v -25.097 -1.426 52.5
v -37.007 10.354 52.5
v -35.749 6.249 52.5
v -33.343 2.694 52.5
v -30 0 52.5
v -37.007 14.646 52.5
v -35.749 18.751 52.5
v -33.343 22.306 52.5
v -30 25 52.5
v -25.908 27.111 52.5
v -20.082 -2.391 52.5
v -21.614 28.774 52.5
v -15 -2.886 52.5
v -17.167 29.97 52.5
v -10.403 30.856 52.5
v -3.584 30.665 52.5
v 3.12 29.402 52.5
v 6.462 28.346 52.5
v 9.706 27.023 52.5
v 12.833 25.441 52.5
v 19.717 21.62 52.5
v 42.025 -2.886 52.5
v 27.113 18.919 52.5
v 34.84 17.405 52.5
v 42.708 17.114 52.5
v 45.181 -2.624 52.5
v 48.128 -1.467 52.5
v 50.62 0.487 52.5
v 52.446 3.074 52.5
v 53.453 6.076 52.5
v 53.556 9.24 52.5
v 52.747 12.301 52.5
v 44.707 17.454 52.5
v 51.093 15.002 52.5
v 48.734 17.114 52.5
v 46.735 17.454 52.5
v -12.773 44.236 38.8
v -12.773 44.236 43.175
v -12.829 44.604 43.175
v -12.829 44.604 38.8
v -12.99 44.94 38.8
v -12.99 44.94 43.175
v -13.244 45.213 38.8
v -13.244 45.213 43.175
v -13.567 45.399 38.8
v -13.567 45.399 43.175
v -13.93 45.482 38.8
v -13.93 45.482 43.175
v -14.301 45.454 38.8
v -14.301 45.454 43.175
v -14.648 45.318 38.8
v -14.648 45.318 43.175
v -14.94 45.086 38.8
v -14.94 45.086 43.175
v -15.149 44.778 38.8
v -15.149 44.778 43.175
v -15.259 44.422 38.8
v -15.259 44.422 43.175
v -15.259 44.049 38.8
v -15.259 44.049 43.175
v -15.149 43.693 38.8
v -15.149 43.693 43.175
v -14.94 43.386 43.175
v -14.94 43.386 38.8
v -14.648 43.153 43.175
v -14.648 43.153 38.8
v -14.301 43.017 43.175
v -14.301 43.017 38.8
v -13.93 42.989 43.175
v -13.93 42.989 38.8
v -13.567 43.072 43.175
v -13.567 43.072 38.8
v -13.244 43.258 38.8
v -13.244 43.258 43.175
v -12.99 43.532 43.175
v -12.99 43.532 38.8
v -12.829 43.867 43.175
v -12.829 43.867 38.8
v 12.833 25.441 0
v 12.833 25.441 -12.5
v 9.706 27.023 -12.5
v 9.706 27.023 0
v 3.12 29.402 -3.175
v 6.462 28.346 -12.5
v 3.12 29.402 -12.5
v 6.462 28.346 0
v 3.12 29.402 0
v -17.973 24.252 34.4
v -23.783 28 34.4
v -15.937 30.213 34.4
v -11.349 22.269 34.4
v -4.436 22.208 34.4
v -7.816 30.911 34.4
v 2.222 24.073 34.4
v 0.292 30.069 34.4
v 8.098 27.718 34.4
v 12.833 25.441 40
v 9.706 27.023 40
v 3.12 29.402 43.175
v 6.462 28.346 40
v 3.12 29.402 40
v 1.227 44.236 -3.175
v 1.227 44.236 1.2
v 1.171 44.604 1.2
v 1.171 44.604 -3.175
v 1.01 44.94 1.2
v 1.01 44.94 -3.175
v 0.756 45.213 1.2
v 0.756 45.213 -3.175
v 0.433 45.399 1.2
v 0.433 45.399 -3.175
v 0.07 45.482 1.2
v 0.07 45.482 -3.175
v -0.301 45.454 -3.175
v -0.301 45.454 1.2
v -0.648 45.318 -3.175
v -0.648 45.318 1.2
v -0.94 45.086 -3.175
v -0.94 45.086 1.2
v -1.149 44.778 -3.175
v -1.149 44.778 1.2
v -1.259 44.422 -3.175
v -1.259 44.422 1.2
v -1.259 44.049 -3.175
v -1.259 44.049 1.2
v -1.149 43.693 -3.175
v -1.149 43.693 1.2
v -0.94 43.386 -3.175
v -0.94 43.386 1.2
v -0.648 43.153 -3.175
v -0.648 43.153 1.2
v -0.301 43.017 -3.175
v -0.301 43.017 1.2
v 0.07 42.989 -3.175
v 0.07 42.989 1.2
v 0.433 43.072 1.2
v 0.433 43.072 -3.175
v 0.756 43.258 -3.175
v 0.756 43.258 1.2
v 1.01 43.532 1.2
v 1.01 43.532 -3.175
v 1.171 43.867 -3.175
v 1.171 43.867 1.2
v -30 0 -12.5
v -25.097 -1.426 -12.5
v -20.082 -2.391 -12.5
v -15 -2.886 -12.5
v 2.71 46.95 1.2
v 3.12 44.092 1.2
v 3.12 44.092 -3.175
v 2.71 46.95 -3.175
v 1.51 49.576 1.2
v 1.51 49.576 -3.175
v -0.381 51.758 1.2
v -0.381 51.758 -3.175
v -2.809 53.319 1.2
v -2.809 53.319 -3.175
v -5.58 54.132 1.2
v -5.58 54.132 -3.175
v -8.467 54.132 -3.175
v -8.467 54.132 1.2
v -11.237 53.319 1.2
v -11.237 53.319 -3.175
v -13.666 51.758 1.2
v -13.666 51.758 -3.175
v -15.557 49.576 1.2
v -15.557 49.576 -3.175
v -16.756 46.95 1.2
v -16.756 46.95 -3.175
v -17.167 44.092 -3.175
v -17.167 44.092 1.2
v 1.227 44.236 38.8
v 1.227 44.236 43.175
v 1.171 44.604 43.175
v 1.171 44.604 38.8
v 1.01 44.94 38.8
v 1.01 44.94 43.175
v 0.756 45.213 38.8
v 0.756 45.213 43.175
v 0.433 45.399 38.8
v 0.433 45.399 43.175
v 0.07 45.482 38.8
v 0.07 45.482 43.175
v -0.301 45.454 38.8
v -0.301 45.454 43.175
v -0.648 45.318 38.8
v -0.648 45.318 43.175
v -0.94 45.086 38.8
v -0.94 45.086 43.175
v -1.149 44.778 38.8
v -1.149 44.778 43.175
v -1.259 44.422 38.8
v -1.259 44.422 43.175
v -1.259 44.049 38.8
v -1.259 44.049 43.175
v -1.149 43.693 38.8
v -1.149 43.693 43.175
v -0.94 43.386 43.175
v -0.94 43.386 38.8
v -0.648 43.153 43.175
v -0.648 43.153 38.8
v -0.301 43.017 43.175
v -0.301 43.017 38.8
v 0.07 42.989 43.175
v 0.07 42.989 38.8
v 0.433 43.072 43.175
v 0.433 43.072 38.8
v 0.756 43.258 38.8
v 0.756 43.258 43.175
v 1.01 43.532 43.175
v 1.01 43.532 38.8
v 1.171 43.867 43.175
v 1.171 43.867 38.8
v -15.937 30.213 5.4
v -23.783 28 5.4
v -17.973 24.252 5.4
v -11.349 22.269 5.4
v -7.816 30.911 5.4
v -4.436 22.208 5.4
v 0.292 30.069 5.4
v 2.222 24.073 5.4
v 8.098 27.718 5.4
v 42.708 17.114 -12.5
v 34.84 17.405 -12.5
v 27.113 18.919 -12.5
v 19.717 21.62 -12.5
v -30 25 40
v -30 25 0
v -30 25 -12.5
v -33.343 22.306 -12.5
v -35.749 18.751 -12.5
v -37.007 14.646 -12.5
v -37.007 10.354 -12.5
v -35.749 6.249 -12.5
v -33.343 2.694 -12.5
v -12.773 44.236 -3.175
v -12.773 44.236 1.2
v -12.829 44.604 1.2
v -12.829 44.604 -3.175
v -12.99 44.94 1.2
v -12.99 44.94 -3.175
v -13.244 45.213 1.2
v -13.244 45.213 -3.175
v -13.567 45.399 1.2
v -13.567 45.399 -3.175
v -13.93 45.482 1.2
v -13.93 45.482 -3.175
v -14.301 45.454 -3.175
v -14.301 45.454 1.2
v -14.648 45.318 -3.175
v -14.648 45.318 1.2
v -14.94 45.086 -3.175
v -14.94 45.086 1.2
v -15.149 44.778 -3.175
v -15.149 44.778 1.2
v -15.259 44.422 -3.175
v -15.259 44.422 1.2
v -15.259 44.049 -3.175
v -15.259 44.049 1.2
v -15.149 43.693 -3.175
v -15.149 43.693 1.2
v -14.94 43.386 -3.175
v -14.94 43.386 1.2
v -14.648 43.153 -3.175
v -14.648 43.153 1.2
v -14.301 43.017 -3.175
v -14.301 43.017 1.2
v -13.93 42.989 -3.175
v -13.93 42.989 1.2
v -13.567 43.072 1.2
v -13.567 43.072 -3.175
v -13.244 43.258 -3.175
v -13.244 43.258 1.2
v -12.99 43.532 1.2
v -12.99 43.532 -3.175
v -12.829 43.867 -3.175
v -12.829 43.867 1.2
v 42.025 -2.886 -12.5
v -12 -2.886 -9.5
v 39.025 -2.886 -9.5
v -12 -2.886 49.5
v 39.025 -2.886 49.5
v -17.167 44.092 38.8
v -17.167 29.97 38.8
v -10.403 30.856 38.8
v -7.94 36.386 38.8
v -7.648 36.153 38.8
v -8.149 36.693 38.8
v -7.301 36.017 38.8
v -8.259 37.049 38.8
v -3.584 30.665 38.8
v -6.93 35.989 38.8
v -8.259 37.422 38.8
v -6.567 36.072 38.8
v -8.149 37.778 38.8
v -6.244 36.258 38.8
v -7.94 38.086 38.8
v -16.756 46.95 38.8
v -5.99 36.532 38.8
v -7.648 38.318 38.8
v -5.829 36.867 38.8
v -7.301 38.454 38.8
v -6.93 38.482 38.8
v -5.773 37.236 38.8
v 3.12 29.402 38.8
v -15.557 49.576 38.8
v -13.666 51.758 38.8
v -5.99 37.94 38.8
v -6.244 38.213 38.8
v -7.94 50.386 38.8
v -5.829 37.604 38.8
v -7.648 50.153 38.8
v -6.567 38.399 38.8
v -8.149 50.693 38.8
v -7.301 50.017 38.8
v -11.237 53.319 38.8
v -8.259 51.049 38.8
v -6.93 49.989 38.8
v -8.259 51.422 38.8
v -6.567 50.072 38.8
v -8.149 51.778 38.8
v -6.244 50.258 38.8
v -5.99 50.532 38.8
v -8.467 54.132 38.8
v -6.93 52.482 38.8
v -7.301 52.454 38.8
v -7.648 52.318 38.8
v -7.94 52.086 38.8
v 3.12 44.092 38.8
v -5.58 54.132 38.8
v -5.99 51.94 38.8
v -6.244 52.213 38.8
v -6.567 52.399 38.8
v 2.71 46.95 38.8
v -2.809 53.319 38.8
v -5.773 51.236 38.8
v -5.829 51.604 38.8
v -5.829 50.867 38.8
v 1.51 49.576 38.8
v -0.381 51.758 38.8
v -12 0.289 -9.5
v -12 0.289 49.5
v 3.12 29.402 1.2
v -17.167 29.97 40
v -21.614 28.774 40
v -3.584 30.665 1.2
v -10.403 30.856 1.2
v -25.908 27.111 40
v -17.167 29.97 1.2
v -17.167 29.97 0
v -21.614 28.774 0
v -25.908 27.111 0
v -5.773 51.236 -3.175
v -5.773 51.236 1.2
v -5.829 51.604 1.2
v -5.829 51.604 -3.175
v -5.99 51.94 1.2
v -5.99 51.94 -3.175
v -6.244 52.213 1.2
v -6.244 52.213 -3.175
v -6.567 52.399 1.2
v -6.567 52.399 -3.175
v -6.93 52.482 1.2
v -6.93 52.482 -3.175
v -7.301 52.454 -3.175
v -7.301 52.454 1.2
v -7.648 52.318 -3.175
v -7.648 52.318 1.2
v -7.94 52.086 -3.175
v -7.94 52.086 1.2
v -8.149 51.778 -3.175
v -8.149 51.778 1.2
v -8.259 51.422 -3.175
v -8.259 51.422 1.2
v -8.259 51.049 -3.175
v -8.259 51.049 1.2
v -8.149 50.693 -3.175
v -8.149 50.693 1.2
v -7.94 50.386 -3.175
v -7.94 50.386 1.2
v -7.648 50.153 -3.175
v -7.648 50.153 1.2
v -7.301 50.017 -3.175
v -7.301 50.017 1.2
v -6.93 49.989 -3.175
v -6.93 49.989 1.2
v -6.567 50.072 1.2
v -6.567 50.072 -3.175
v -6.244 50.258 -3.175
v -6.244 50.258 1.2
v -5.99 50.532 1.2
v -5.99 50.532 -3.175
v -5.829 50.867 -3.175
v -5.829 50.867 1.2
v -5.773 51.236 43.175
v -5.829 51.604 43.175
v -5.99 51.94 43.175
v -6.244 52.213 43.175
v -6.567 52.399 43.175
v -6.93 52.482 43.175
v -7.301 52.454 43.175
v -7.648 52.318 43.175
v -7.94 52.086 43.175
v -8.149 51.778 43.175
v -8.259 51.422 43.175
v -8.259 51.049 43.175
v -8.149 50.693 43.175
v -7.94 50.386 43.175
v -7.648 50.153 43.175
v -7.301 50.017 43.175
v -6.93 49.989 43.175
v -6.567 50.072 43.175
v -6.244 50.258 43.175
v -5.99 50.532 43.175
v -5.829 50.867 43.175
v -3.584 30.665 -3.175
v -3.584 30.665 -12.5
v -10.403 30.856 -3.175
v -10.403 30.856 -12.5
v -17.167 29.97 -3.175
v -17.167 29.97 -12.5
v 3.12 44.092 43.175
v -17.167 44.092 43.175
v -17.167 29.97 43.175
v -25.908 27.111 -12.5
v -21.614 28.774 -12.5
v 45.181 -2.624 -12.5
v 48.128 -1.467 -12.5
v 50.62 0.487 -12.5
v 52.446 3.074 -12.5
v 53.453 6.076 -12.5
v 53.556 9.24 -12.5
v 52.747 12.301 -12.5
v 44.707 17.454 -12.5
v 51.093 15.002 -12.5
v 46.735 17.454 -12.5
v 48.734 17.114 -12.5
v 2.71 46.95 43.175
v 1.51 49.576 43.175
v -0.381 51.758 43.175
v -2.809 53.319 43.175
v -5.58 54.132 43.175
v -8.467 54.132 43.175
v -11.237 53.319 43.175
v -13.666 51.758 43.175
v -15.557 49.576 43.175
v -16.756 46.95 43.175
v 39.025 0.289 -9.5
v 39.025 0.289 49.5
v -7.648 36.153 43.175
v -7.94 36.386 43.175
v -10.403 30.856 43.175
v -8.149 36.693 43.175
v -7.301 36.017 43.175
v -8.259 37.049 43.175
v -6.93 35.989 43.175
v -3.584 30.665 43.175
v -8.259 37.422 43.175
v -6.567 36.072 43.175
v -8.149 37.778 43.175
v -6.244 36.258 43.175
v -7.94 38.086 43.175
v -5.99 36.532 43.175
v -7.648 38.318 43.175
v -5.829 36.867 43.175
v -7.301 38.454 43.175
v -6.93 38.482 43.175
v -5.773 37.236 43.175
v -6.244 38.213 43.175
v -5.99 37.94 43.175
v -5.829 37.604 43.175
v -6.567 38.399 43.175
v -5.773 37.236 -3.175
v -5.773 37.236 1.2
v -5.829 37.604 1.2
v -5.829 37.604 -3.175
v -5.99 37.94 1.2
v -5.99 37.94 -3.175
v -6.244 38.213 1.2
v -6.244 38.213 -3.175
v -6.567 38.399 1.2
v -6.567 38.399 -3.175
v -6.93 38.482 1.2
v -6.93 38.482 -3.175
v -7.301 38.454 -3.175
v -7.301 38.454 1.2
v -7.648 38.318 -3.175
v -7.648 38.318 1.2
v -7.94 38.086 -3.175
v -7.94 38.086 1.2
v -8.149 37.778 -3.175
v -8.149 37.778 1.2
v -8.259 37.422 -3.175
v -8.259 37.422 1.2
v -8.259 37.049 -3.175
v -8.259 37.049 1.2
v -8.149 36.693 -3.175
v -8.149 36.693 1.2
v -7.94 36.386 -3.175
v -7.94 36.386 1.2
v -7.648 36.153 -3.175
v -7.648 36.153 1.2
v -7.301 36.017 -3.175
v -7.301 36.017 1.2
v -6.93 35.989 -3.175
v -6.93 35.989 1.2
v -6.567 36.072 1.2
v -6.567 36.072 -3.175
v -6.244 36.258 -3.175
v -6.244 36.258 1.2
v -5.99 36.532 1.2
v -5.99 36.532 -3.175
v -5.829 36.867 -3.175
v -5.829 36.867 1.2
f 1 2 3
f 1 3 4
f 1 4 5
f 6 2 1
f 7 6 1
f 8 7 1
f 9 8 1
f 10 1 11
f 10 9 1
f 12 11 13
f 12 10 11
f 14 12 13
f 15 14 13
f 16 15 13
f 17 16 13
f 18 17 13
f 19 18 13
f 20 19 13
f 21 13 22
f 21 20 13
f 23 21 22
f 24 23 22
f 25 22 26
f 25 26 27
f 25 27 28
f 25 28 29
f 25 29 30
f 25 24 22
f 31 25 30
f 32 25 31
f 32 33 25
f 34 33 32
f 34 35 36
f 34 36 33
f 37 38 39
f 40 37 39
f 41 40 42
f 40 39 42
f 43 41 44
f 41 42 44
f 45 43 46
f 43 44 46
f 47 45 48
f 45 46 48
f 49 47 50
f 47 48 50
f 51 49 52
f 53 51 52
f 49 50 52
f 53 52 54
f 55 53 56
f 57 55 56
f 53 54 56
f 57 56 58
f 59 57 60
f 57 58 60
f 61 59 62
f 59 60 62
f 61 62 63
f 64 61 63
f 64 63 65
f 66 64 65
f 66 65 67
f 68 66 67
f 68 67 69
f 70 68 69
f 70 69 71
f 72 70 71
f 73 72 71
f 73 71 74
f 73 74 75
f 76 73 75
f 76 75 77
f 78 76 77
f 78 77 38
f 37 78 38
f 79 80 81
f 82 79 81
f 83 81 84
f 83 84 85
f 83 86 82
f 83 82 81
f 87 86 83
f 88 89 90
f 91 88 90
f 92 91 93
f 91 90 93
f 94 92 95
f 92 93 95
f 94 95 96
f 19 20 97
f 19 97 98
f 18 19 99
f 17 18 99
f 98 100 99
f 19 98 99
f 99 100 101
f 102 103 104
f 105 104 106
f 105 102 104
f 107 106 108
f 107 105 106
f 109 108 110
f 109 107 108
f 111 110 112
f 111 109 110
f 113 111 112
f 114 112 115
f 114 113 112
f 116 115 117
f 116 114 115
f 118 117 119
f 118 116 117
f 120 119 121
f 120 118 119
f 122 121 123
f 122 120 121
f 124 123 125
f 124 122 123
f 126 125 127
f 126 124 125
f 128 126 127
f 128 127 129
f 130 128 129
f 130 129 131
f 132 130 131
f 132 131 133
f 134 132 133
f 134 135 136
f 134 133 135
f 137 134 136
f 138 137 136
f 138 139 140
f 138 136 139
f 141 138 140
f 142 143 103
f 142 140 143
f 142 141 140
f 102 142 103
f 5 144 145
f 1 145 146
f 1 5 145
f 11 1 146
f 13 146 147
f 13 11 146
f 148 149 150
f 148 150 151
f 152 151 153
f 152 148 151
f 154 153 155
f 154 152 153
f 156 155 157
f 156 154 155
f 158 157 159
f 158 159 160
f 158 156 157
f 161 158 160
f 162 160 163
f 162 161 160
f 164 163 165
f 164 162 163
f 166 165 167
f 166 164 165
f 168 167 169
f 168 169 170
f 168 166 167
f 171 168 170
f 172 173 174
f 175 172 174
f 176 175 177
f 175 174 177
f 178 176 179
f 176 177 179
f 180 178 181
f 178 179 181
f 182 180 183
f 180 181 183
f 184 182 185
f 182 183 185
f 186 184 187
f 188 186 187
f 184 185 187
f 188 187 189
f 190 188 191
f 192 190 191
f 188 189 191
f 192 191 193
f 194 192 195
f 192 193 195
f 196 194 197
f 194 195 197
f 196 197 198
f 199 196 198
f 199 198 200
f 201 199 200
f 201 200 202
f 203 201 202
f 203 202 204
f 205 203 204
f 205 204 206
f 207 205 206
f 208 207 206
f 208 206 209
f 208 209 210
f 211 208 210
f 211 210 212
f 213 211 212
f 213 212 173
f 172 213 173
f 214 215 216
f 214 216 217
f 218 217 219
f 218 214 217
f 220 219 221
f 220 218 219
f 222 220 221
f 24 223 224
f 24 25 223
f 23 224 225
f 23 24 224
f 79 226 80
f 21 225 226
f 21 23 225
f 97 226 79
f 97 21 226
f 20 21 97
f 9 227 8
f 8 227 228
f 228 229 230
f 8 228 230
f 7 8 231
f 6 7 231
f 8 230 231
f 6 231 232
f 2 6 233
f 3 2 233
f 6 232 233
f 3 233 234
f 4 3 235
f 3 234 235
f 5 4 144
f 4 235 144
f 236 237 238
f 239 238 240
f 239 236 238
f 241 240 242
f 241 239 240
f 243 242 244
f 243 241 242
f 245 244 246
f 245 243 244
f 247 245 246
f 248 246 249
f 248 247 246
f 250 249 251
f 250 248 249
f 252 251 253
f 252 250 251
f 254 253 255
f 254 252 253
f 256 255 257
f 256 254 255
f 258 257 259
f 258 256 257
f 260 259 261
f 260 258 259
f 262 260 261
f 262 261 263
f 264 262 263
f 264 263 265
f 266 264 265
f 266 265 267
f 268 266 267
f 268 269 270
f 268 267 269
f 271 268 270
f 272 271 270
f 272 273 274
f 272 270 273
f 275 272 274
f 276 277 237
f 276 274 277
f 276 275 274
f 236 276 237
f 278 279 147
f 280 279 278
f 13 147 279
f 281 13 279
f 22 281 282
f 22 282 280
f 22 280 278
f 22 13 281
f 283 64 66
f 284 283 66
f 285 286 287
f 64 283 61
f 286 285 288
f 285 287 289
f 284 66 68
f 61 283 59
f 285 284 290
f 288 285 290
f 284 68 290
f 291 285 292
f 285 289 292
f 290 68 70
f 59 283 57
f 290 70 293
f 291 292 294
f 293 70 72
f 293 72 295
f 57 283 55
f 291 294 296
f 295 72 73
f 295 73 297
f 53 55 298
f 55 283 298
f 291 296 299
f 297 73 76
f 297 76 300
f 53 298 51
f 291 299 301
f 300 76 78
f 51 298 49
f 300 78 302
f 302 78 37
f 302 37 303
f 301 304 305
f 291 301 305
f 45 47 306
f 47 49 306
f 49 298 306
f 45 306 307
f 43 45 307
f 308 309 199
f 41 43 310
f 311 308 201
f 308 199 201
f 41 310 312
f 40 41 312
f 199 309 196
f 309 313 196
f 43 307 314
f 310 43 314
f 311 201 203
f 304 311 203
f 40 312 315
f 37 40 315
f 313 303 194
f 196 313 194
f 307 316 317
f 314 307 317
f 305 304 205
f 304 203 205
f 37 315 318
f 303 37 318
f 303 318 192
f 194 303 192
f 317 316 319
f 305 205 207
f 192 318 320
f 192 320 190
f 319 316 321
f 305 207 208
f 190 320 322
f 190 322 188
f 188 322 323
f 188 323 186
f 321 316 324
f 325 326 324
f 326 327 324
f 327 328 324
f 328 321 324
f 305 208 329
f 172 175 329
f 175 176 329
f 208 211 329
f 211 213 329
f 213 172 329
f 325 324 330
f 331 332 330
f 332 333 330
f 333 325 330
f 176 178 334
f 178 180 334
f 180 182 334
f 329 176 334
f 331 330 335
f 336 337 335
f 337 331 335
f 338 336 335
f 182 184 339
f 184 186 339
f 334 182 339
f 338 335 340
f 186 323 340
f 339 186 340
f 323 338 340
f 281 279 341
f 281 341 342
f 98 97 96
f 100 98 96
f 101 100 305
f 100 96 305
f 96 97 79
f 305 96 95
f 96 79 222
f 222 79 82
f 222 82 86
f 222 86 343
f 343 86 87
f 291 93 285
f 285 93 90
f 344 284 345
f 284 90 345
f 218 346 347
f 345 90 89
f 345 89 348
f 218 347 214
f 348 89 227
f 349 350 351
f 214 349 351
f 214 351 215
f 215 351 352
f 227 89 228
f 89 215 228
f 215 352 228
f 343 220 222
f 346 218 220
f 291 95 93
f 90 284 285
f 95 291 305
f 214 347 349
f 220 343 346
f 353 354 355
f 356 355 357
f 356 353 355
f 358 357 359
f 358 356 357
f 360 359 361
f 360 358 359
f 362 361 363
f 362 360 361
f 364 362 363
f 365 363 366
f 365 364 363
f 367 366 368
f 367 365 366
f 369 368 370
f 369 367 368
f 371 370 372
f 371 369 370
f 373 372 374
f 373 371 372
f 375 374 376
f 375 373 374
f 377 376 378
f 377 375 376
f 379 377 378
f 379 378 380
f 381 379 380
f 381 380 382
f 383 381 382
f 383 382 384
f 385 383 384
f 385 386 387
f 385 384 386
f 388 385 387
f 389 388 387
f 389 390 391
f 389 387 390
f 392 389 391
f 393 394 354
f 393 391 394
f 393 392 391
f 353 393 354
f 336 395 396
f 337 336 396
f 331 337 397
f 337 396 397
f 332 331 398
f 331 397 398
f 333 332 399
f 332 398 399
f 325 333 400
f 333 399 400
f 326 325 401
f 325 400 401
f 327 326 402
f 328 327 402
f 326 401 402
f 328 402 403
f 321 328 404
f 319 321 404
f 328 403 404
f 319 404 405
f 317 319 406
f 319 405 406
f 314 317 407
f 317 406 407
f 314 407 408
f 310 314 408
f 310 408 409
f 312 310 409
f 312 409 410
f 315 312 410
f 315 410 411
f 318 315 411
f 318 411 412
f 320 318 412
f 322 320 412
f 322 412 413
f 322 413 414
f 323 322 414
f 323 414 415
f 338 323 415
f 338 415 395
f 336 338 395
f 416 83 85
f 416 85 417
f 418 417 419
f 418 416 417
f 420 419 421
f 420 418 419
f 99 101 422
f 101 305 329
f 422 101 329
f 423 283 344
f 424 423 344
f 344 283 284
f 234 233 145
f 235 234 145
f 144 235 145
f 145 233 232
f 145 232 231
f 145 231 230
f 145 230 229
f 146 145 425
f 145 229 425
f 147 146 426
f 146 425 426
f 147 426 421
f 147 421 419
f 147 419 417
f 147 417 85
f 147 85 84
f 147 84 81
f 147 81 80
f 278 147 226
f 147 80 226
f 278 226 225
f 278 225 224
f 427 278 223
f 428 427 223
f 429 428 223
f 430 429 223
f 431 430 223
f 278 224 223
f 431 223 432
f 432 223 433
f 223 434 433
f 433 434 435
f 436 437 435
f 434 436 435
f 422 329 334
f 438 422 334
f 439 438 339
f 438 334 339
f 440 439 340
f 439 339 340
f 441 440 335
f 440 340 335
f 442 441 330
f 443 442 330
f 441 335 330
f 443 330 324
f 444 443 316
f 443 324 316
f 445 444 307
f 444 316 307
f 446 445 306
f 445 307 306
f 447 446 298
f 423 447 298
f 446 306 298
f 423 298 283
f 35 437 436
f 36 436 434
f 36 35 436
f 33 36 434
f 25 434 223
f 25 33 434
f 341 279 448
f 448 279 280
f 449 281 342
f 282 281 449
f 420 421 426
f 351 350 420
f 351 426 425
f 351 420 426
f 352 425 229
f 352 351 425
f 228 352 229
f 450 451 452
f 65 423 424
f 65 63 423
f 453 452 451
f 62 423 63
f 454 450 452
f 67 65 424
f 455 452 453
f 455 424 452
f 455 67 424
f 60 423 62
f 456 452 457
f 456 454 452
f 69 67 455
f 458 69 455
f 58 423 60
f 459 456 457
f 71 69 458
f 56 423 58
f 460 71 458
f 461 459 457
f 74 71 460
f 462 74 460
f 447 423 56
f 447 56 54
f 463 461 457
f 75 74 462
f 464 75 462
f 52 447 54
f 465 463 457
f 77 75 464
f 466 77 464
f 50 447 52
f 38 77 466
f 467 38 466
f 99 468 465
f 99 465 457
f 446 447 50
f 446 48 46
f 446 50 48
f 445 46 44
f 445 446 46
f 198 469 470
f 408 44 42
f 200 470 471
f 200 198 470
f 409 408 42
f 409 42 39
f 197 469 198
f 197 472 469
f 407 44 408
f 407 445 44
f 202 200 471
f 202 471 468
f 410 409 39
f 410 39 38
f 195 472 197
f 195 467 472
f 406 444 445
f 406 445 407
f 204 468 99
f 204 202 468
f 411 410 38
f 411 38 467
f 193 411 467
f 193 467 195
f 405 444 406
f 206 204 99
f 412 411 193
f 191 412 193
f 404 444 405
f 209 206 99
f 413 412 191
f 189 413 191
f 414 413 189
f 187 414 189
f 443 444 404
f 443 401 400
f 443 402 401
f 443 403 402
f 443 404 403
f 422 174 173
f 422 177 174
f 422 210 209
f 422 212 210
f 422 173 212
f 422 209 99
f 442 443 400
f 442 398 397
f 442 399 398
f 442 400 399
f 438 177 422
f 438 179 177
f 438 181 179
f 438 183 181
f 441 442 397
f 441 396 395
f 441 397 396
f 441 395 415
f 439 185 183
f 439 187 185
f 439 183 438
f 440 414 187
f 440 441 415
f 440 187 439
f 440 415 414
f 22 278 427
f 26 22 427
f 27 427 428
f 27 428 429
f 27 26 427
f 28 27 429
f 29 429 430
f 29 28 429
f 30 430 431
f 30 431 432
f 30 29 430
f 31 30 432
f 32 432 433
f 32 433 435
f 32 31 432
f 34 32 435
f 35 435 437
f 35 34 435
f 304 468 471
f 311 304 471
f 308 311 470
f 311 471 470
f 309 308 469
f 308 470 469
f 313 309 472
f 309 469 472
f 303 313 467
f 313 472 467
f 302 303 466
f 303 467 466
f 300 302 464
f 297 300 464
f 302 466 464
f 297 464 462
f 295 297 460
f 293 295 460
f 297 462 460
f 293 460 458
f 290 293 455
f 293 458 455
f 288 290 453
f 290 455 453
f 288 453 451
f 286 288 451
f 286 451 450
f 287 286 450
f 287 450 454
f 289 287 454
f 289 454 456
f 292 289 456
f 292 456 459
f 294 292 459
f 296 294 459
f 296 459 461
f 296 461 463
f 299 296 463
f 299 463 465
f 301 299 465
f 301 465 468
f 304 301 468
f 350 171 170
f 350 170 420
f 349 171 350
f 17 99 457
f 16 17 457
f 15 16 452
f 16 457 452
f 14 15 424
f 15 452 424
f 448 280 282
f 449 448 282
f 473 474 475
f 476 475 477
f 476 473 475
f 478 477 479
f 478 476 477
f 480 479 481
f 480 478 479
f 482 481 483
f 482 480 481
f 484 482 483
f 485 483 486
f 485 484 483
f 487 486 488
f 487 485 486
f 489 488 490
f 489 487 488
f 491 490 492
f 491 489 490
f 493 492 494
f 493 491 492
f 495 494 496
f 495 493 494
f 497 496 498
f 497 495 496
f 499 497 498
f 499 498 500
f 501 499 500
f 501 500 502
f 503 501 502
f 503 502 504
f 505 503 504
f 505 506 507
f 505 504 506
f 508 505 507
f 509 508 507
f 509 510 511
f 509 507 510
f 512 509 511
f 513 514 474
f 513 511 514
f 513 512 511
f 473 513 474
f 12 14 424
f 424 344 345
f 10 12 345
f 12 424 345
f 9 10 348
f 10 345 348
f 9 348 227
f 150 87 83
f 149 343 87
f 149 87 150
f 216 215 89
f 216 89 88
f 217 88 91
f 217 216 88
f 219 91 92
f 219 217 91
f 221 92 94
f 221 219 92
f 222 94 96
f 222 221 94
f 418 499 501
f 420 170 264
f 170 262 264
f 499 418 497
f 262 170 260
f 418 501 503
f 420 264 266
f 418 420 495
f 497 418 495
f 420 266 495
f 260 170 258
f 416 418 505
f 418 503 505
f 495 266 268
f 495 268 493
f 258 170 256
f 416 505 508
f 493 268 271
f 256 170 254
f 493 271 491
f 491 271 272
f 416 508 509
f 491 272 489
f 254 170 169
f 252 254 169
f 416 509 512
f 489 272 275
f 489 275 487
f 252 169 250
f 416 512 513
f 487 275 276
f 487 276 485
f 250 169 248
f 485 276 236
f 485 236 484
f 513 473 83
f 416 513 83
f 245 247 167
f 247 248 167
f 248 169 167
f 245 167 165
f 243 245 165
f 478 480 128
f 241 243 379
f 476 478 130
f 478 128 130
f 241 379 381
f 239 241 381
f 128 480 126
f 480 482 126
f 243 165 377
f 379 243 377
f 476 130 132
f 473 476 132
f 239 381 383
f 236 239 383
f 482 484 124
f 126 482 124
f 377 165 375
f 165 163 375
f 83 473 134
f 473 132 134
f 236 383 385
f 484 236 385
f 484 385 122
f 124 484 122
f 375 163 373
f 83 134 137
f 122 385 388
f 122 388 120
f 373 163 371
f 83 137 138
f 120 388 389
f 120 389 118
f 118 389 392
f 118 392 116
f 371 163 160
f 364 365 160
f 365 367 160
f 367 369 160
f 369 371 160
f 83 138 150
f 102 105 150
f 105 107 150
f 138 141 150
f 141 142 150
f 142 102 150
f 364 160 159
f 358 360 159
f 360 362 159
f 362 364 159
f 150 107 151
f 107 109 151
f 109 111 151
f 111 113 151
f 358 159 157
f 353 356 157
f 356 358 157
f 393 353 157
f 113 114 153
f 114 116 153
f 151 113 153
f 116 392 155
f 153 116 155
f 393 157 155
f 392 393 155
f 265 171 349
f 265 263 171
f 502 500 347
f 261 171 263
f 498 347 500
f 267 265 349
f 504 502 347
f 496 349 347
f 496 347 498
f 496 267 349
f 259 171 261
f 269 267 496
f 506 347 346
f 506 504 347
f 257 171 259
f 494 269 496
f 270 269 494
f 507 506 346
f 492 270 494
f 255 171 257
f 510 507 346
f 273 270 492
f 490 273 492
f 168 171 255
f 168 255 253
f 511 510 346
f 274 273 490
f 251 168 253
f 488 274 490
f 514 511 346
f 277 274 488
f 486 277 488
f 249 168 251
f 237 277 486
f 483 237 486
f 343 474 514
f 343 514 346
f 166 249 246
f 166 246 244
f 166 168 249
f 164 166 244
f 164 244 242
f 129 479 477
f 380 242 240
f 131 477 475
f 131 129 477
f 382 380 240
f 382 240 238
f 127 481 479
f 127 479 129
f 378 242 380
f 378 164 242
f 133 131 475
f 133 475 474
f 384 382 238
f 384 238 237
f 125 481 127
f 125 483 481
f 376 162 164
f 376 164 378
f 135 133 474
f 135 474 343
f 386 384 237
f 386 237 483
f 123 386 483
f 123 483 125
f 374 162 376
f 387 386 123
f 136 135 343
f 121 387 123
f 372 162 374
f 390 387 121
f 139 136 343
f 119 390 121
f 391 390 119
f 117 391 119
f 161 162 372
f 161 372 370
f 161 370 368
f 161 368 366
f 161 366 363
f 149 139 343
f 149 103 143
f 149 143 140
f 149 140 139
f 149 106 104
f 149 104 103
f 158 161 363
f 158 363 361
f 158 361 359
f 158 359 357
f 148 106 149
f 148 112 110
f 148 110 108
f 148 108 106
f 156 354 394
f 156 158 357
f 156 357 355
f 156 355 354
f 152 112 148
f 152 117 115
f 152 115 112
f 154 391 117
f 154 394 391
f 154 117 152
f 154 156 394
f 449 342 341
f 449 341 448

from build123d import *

# Parameters (mm, degrees)
BOSS_EXTRUDE1_DEPTH = 40
BOSS_EXTRUDE2_START = -1.2
BOSS_EXTRUDE2_DEPTH = 4.375
CUT_EXTRUDE2_START  = -29
CUT_EXTRUDE2_DEPTH  = 29
SKETCH10_R          = 1.25
CUT_EXTRUDE4_DEPTH  = 10
BOSS_EXTRUDE3_DEPTH = 12.5
SKETCH5_W           = 51.025429481
SKETCH5_H           = 59
CUT_EXTRUDE3_DEPTH  = 3.175


with BuildPart() as part:
    # Sketch1 → Boss-Extrude1 (new body)
    with BuildSketch(Plane.XY):
        with BuildLine():
            Line((-15, -2.886329782), (42.025429481, -2.886329782))
            ThreePointArc((42.025429481, -2.886329782), (53.05879951, 4.537892473), (48.73397068, 17.113670218))
            ThreePointArc((48.73397068, 17.113670218), (45.721020148, 17.497008544), (42.708069616, 17.113670218))
            ThreePointArc((42.708069616, 17.113670218), (27.113259503, 18.919115101), (12.833158081, 25.441111501))
            ThreePointArc((12.833158081, 25.441111501), (-8.642012727, 30.909979938), (-30, 25))
            ThreePointArc((-30, 25), (-37.166841919, 12.5), (-30, 0))
            ThreePointArc((-30, 0), (-22.60067635, -1.966370959), (-15, -2.886329782))
        make_face()
    extrude(amount=BOSS_EXTRUDE1_DEPTH)

    # Sketch3 → Boss-Extrude2 (add)
    with BuildSketch(Plane.XY.offset(40).offset(BOSS_EXTRUDE2_START)):
        with BuildLine():
            Line((-17.166841919, 44.092125176), (-17.166841919, 16.592125176))
            Line((-17.166841919, 16.592125176), (3.120389758, 16.592125176))
            Line((3.120389758, 16.592125176), (3.120389758, 44.092125176))
            ThreePointArc((3.120389758, 44.092125176), (-7.02322608, 54.235741015), (-17.166841919, 44.092125176))
        make_face()
    boss_extrude2 = extrude(amount=BOSS_EXTRUDE2_DEPTH)

    # Sketch4 → Cut-Extrude2 (cut)
    with BuildSketch(Plane.XY.offset(34.4).offset(CUT_EXTRUDE2_START)):
        with BuildLine():
            ThreePointArc((-23.782802313, 27.999798652), (-7.894532573, 21.994601327), (8.097551753, 27.717603087))
            ThreePointArc((8.097551753, 27.717603087), (-7.81561096, 30.910577643), (-23.782802313, 27.999798652))
        make_face()
    extrude(amount=CUT_EXTRUDE2_DEPTH, mode=Mode.SUBTRACT)

    # Sketch10 → Cut-Extrude4 (cut)
    with BuildSketch(Plane.XY.offset(43.175)):
        with Locations((-7.02322608, 51.235741015)):
            Circle(SKETCH10_R)
        with Locations((-0.02322608, 44.235741015)):
            Circle(SKETCH10_R)
        with Locations((-7.02322608, 37.235741015)):
            Circle(SKETCH10_R)
        with Locations((-14.02322608, 44.235741015)):
            Circle(SKETCH10_R)
    cut_extrude4 = extrude(amount=-CUT_EXTRUDE4_DEPTH, mode=Mode.SUBTRACT)

    # Sketch6 → Boss-Extrude3 (add)
    with BuildSketch(Plane.XY.offset(40)):
        with BuildLine():
            ThreePointArc((12.833158081, 25.441111501), (8.097551753, 27.717603087), (3.120389758, 29.401717013))
            Line((3.120389758, 29.401717013), (3.120389758, 16.592125176))
            Line((3.120389758, 16.592125176), (-17.166841919, 16.592125176))
            Line((-17.166841919, 16.592125176), (-17.166841919, 29.969927353))
            ThreePointArc((-17.166841919, 29.969927353), (-23.782802313, 27.999798652), (-30, 25))
            ThreePointArc((-30, 25), (-37.166841919, 12.5), (-30, 0))
            ThreePointArc((-30, 0), (-22.60067635, -1.966370959), (-15, -2.886329782))
            Line((-15, -2.886329782), (42.025429481, -2.886329782))
            ThreePointArc((42.025429481, -2.886329782), (53.05879951, 4.537892473), (48.73397068, 17.113670218))
            ThreePointArc((48.73397068, 17.113670218), (45.721020148, 17.497008544), (42.708069616, 17.113670218))
            ThreePointArc((42.708069616, 17.113670218), (27.113259503, 18.919115101), (12.833158081, 25.441111501))
        make_face()
        with BuildLine():
            Line((3.120389758, 16.592125176), (3.120389758, 29.401717013))
            ThreePointArc((3.120389758, 29.401717013), (-6.989349265, 30.895351044), (-17.166841919, 29.969927353))
            Line((-17.166841919, 29.969927353), (-17.166841919, 16.592125176))
            Line((-17.166841919, 16.592125176), (3.120389758, 16.592125176))
        make_face()
    boss_extrude3 = extrude(amount=BOSS_EXTRUDE3_DEPTH)

    # Mirror4: Boss-Extrude3 across plane
    add(boss_extrude3.mirror(Plane(origin=(0, 0, 20), x_dir=(1, 0, 0), z_dir=(0, 0, -1))))

    # Sketch5 → Cut-Extrude3 (cut)
    with BuildSketch(Plane.XZ.offset(2.886329782)):
        with Locations((13.512714741, 20)):
            Rectangle(SKETCH5_W, SKETCH5_H)
    extrude(amount=-CUT_EXTRUDE3_DEPTH, mode=Mode.SUBTRACT)

    # Mirror5: Boss-Extrude2, Cut-Extrude4 across plane
    add(boss_extrude2.mirror(Plane(origin=(0, 0, 20), x_dir=(1, 0, 0), z_dir=(0, 0, -1))))
    add(cut_extrude4.mirror(Plane(origin=(0, 0, 20), x_dir=(1, 0, 0), z_dir=(0, 0, -1))), mode=Mode.SUBTRACT)


solid = part.part
